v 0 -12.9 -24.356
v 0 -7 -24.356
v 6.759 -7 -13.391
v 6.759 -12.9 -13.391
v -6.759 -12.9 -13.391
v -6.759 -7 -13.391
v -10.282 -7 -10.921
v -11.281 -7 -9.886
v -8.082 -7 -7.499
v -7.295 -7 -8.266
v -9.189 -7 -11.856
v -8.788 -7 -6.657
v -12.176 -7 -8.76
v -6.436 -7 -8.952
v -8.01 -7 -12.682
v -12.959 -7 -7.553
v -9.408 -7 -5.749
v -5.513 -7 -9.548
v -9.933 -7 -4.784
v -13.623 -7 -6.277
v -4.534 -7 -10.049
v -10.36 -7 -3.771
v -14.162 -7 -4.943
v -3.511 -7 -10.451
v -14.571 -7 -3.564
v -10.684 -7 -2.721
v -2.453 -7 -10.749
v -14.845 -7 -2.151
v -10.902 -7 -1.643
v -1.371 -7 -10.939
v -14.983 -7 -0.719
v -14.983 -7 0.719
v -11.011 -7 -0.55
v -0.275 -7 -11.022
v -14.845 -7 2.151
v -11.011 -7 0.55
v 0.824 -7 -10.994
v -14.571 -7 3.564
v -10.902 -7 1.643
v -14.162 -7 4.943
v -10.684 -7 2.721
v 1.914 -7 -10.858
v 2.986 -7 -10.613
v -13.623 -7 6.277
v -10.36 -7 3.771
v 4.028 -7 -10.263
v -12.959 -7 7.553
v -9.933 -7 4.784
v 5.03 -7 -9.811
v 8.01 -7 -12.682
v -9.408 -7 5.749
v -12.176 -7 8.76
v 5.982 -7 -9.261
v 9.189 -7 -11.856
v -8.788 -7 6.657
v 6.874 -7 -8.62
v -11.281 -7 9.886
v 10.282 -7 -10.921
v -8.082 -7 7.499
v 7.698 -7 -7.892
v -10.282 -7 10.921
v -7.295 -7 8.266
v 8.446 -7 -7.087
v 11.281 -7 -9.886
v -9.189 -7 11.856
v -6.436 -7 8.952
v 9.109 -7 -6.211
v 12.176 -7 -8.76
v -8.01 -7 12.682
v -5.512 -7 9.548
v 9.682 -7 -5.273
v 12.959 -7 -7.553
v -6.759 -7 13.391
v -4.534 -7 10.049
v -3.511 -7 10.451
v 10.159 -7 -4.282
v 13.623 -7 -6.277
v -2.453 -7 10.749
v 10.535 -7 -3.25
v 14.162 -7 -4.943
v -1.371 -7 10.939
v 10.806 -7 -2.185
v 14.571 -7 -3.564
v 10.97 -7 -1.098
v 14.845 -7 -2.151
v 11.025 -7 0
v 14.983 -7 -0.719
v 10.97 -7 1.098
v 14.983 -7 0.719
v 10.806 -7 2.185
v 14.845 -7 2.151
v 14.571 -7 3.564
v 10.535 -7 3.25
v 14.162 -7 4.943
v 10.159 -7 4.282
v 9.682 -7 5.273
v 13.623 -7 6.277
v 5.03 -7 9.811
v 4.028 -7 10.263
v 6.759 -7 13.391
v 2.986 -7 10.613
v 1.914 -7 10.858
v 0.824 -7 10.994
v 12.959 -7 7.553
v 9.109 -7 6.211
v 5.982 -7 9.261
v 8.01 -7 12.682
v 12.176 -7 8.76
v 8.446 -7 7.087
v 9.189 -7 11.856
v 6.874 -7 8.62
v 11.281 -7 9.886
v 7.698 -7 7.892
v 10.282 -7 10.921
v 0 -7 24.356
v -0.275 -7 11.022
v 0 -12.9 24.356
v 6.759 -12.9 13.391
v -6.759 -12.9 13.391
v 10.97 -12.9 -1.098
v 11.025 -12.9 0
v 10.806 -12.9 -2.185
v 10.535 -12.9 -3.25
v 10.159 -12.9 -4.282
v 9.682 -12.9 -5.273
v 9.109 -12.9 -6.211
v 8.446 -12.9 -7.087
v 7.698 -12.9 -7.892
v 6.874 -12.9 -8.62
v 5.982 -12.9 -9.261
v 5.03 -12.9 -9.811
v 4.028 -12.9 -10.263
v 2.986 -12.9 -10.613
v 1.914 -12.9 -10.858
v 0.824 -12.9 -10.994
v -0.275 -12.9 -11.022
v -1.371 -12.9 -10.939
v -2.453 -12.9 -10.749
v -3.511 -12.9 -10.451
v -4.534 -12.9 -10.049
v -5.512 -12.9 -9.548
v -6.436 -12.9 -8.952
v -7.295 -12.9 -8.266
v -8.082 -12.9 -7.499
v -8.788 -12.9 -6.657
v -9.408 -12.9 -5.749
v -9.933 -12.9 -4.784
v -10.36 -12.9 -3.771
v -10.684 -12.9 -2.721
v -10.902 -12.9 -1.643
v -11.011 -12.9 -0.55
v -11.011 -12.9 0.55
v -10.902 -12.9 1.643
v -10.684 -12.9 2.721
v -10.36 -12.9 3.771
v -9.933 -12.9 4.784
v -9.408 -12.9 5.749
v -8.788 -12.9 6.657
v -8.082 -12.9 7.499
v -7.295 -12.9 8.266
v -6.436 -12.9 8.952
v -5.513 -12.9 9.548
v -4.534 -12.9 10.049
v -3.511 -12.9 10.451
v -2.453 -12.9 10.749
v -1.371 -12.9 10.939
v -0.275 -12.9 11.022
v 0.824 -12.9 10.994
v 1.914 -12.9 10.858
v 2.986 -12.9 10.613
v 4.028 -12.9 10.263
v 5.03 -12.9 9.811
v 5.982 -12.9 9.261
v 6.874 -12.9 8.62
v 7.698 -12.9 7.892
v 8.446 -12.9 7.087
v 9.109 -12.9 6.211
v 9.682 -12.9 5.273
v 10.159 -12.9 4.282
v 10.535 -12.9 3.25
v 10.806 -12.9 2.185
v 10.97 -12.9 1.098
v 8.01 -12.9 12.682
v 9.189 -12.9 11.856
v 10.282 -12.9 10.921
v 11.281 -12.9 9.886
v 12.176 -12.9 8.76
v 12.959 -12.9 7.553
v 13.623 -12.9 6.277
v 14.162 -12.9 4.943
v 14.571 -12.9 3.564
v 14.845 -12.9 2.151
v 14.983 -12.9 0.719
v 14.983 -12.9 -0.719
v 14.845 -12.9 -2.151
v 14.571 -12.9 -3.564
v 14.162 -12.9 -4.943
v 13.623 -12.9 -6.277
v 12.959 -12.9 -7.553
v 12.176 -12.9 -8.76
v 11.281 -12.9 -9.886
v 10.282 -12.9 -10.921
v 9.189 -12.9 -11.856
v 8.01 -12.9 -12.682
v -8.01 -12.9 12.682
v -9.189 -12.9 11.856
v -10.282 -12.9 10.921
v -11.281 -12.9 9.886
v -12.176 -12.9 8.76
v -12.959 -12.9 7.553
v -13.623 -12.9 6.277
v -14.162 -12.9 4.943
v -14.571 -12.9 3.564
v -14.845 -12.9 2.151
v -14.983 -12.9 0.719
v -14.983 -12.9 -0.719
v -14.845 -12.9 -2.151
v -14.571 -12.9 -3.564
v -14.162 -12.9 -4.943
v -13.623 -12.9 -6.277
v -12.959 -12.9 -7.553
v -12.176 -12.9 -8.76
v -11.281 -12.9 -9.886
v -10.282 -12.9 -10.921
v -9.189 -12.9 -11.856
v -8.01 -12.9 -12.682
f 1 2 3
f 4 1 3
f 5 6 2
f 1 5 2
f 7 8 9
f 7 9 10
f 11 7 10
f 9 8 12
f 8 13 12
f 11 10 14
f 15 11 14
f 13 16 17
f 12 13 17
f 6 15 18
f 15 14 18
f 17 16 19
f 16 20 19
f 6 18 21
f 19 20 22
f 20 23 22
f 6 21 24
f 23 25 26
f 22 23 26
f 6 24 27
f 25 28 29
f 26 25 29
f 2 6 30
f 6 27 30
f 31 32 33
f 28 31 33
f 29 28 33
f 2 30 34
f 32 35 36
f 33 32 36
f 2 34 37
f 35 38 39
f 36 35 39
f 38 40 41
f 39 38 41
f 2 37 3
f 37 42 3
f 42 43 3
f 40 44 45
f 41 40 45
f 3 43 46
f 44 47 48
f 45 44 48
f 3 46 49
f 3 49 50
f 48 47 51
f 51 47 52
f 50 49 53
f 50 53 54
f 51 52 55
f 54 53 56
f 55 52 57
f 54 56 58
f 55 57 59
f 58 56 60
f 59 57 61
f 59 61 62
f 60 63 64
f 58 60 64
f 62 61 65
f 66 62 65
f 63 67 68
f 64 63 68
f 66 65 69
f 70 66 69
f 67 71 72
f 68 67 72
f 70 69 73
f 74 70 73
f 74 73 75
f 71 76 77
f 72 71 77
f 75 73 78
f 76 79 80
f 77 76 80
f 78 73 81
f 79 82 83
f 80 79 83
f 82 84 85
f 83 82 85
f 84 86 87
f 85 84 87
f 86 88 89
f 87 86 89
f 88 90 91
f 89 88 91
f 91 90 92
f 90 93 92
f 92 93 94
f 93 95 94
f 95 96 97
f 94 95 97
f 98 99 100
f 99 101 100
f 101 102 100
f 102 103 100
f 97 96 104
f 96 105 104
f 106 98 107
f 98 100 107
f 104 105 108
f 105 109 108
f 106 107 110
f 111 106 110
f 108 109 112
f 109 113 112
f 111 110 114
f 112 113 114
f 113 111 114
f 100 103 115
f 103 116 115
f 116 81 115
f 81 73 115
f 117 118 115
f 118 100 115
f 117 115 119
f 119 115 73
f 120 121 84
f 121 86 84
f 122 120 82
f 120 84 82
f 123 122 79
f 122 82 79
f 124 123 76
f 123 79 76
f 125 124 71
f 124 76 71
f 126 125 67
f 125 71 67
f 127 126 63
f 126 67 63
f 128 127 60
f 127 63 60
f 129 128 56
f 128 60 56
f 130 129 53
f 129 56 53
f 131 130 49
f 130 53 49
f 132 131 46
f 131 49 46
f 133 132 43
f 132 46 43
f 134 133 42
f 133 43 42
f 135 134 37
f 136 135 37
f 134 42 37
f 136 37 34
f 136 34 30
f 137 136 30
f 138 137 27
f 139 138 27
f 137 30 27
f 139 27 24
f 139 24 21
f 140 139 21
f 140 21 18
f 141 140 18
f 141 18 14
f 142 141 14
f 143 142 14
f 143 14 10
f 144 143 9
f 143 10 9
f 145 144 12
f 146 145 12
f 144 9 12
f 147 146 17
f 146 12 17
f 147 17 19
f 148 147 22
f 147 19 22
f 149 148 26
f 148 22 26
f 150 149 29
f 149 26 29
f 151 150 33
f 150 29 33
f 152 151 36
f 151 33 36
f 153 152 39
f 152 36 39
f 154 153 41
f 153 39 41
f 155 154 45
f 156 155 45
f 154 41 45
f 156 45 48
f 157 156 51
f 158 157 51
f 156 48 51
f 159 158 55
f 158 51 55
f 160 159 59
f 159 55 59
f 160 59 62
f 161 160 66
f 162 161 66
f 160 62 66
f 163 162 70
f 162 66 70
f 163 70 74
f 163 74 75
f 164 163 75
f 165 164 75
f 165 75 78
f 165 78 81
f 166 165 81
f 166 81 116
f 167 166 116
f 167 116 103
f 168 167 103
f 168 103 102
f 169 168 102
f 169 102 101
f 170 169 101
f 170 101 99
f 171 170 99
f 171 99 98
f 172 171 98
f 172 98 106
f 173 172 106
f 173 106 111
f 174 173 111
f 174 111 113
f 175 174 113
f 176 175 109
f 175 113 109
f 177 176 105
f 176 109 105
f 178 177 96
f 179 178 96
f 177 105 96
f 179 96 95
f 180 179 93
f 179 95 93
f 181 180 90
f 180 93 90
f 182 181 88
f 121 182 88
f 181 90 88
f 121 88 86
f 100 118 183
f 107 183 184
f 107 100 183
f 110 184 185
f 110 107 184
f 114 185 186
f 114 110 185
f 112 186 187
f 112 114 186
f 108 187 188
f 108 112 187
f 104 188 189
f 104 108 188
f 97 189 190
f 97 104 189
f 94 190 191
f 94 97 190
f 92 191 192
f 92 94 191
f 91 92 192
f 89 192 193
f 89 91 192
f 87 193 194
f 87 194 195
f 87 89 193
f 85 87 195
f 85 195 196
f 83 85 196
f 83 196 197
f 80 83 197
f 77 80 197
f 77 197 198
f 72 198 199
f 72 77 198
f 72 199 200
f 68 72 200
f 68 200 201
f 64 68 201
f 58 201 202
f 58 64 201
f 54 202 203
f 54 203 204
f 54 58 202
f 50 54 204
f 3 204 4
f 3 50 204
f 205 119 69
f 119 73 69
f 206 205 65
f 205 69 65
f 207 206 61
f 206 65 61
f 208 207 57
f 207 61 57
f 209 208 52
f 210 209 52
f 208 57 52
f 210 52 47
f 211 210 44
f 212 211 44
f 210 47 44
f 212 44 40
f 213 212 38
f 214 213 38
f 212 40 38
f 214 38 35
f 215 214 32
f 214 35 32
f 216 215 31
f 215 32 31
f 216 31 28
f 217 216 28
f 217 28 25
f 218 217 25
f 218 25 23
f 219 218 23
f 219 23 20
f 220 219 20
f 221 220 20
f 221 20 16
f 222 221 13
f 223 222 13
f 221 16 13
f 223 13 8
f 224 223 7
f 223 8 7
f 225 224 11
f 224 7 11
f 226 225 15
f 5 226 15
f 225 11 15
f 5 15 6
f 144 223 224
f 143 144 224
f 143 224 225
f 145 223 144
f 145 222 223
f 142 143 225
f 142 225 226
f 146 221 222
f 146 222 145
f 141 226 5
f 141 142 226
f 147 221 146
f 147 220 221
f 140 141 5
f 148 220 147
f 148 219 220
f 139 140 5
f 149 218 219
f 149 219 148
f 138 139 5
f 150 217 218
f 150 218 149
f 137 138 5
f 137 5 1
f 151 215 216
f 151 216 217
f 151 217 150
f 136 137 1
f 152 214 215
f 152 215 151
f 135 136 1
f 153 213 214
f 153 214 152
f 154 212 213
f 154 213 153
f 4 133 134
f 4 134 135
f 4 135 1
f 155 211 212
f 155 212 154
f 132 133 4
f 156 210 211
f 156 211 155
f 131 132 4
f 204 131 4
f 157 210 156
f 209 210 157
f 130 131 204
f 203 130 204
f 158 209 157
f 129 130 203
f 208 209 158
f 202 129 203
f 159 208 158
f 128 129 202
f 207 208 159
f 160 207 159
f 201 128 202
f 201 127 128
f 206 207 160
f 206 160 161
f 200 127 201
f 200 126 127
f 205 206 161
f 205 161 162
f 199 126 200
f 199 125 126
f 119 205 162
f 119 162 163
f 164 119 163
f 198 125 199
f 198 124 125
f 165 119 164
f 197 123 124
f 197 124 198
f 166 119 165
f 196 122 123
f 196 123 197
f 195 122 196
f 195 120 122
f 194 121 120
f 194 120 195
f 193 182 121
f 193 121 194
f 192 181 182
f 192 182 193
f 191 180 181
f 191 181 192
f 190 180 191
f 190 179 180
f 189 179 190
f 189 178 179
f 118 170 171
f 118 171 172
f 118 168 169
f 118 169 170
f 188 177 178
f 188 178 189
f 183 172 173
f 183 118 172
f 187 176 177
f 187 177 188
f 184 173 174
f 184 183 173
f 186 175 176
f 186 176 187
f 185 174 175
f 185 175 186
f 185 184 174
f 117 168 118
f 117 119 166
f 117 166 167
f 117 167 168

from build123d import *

# Parameters (mm, degrees)
F0_R     = 15
F0_R_2   = 11.025
F3_DEPTH = 25
F2_R     = 11.025
F4_DEPTH = 40.1
F6_DEPTH = 15
F7_DEPTH = 7
F8_DEPTH = 2.9


# Not quite as in the source:
# - ends of sketch curves that miss each other by under 0.0002 mm in the source are joined


with BuildPart() as f3:
    # F0 (on Front) → F3 (new body)
    with BuildSketch(Plane.XZ):
        Circle(F0_R)
        Circle(F0_R_2, mode=Mode.SUBTRACT)
    extrude(amount=F3_DEPTH)


with BuildPart() as f3b:
    # F1 (on Front) → F3, piece 2 (new body)
    with BuildSketch(Plane.XZ):
        Polygon((0, 24.356296724), (-6.821225702, 13.2896405025), (-6.821225702, 0), (0, 0), (6.821225702, 0), (6.821225702, 13.2896405025), align=None)
        Polygon((0, 0), (-6.821225702, 0), (-6.821225702, -10.4577671736), (-6.82123, -10.4854255915), (-6.821225702, -13.2896405025), (0, -24.356296724), (6.821225702, -13.2896405025), (6.821225702, 0), align=None)
    extrude(amount=F3_DEPTH)

    # F2 (on face) → F4 (cut)
    with BuildSketch(Plane.XZ):
        Circle(F2_R)
    extrude(amount=F4_DEPTH, mode=Mode.SUBTRACT)

    # F5: union F3
    add(f3.part)

    # F6 (cut): a face of the model
    f6_faces = [f3b.faces().sort_by_distance(p)[0] for p in [
        (-11.5970941147, -25, 0),
    ]]
    extrude(f6_faces, amount=-F6_DEPTH, mode=Mode.SUBTRACT)

    # F7 (cut): a face of the model
    f7_faces = [f3b.faces().sort_by_distance(p)[0] for p in [
        (-11.5970941147, 0, 0),
    ]]
    extrude(f7_faces, amount=-F7_DEPTH, mode=Mode.SUBTRACT)

    # F8 (add): a face of the model
    f8_faces = [f3b.faces().sort_by_distance(p)[0] for p in [
        (-11.5970941147, -10, 0),
    ]]
    extrude(f8_faces, amount=F8_DEPTH)


solid = f3b.part
